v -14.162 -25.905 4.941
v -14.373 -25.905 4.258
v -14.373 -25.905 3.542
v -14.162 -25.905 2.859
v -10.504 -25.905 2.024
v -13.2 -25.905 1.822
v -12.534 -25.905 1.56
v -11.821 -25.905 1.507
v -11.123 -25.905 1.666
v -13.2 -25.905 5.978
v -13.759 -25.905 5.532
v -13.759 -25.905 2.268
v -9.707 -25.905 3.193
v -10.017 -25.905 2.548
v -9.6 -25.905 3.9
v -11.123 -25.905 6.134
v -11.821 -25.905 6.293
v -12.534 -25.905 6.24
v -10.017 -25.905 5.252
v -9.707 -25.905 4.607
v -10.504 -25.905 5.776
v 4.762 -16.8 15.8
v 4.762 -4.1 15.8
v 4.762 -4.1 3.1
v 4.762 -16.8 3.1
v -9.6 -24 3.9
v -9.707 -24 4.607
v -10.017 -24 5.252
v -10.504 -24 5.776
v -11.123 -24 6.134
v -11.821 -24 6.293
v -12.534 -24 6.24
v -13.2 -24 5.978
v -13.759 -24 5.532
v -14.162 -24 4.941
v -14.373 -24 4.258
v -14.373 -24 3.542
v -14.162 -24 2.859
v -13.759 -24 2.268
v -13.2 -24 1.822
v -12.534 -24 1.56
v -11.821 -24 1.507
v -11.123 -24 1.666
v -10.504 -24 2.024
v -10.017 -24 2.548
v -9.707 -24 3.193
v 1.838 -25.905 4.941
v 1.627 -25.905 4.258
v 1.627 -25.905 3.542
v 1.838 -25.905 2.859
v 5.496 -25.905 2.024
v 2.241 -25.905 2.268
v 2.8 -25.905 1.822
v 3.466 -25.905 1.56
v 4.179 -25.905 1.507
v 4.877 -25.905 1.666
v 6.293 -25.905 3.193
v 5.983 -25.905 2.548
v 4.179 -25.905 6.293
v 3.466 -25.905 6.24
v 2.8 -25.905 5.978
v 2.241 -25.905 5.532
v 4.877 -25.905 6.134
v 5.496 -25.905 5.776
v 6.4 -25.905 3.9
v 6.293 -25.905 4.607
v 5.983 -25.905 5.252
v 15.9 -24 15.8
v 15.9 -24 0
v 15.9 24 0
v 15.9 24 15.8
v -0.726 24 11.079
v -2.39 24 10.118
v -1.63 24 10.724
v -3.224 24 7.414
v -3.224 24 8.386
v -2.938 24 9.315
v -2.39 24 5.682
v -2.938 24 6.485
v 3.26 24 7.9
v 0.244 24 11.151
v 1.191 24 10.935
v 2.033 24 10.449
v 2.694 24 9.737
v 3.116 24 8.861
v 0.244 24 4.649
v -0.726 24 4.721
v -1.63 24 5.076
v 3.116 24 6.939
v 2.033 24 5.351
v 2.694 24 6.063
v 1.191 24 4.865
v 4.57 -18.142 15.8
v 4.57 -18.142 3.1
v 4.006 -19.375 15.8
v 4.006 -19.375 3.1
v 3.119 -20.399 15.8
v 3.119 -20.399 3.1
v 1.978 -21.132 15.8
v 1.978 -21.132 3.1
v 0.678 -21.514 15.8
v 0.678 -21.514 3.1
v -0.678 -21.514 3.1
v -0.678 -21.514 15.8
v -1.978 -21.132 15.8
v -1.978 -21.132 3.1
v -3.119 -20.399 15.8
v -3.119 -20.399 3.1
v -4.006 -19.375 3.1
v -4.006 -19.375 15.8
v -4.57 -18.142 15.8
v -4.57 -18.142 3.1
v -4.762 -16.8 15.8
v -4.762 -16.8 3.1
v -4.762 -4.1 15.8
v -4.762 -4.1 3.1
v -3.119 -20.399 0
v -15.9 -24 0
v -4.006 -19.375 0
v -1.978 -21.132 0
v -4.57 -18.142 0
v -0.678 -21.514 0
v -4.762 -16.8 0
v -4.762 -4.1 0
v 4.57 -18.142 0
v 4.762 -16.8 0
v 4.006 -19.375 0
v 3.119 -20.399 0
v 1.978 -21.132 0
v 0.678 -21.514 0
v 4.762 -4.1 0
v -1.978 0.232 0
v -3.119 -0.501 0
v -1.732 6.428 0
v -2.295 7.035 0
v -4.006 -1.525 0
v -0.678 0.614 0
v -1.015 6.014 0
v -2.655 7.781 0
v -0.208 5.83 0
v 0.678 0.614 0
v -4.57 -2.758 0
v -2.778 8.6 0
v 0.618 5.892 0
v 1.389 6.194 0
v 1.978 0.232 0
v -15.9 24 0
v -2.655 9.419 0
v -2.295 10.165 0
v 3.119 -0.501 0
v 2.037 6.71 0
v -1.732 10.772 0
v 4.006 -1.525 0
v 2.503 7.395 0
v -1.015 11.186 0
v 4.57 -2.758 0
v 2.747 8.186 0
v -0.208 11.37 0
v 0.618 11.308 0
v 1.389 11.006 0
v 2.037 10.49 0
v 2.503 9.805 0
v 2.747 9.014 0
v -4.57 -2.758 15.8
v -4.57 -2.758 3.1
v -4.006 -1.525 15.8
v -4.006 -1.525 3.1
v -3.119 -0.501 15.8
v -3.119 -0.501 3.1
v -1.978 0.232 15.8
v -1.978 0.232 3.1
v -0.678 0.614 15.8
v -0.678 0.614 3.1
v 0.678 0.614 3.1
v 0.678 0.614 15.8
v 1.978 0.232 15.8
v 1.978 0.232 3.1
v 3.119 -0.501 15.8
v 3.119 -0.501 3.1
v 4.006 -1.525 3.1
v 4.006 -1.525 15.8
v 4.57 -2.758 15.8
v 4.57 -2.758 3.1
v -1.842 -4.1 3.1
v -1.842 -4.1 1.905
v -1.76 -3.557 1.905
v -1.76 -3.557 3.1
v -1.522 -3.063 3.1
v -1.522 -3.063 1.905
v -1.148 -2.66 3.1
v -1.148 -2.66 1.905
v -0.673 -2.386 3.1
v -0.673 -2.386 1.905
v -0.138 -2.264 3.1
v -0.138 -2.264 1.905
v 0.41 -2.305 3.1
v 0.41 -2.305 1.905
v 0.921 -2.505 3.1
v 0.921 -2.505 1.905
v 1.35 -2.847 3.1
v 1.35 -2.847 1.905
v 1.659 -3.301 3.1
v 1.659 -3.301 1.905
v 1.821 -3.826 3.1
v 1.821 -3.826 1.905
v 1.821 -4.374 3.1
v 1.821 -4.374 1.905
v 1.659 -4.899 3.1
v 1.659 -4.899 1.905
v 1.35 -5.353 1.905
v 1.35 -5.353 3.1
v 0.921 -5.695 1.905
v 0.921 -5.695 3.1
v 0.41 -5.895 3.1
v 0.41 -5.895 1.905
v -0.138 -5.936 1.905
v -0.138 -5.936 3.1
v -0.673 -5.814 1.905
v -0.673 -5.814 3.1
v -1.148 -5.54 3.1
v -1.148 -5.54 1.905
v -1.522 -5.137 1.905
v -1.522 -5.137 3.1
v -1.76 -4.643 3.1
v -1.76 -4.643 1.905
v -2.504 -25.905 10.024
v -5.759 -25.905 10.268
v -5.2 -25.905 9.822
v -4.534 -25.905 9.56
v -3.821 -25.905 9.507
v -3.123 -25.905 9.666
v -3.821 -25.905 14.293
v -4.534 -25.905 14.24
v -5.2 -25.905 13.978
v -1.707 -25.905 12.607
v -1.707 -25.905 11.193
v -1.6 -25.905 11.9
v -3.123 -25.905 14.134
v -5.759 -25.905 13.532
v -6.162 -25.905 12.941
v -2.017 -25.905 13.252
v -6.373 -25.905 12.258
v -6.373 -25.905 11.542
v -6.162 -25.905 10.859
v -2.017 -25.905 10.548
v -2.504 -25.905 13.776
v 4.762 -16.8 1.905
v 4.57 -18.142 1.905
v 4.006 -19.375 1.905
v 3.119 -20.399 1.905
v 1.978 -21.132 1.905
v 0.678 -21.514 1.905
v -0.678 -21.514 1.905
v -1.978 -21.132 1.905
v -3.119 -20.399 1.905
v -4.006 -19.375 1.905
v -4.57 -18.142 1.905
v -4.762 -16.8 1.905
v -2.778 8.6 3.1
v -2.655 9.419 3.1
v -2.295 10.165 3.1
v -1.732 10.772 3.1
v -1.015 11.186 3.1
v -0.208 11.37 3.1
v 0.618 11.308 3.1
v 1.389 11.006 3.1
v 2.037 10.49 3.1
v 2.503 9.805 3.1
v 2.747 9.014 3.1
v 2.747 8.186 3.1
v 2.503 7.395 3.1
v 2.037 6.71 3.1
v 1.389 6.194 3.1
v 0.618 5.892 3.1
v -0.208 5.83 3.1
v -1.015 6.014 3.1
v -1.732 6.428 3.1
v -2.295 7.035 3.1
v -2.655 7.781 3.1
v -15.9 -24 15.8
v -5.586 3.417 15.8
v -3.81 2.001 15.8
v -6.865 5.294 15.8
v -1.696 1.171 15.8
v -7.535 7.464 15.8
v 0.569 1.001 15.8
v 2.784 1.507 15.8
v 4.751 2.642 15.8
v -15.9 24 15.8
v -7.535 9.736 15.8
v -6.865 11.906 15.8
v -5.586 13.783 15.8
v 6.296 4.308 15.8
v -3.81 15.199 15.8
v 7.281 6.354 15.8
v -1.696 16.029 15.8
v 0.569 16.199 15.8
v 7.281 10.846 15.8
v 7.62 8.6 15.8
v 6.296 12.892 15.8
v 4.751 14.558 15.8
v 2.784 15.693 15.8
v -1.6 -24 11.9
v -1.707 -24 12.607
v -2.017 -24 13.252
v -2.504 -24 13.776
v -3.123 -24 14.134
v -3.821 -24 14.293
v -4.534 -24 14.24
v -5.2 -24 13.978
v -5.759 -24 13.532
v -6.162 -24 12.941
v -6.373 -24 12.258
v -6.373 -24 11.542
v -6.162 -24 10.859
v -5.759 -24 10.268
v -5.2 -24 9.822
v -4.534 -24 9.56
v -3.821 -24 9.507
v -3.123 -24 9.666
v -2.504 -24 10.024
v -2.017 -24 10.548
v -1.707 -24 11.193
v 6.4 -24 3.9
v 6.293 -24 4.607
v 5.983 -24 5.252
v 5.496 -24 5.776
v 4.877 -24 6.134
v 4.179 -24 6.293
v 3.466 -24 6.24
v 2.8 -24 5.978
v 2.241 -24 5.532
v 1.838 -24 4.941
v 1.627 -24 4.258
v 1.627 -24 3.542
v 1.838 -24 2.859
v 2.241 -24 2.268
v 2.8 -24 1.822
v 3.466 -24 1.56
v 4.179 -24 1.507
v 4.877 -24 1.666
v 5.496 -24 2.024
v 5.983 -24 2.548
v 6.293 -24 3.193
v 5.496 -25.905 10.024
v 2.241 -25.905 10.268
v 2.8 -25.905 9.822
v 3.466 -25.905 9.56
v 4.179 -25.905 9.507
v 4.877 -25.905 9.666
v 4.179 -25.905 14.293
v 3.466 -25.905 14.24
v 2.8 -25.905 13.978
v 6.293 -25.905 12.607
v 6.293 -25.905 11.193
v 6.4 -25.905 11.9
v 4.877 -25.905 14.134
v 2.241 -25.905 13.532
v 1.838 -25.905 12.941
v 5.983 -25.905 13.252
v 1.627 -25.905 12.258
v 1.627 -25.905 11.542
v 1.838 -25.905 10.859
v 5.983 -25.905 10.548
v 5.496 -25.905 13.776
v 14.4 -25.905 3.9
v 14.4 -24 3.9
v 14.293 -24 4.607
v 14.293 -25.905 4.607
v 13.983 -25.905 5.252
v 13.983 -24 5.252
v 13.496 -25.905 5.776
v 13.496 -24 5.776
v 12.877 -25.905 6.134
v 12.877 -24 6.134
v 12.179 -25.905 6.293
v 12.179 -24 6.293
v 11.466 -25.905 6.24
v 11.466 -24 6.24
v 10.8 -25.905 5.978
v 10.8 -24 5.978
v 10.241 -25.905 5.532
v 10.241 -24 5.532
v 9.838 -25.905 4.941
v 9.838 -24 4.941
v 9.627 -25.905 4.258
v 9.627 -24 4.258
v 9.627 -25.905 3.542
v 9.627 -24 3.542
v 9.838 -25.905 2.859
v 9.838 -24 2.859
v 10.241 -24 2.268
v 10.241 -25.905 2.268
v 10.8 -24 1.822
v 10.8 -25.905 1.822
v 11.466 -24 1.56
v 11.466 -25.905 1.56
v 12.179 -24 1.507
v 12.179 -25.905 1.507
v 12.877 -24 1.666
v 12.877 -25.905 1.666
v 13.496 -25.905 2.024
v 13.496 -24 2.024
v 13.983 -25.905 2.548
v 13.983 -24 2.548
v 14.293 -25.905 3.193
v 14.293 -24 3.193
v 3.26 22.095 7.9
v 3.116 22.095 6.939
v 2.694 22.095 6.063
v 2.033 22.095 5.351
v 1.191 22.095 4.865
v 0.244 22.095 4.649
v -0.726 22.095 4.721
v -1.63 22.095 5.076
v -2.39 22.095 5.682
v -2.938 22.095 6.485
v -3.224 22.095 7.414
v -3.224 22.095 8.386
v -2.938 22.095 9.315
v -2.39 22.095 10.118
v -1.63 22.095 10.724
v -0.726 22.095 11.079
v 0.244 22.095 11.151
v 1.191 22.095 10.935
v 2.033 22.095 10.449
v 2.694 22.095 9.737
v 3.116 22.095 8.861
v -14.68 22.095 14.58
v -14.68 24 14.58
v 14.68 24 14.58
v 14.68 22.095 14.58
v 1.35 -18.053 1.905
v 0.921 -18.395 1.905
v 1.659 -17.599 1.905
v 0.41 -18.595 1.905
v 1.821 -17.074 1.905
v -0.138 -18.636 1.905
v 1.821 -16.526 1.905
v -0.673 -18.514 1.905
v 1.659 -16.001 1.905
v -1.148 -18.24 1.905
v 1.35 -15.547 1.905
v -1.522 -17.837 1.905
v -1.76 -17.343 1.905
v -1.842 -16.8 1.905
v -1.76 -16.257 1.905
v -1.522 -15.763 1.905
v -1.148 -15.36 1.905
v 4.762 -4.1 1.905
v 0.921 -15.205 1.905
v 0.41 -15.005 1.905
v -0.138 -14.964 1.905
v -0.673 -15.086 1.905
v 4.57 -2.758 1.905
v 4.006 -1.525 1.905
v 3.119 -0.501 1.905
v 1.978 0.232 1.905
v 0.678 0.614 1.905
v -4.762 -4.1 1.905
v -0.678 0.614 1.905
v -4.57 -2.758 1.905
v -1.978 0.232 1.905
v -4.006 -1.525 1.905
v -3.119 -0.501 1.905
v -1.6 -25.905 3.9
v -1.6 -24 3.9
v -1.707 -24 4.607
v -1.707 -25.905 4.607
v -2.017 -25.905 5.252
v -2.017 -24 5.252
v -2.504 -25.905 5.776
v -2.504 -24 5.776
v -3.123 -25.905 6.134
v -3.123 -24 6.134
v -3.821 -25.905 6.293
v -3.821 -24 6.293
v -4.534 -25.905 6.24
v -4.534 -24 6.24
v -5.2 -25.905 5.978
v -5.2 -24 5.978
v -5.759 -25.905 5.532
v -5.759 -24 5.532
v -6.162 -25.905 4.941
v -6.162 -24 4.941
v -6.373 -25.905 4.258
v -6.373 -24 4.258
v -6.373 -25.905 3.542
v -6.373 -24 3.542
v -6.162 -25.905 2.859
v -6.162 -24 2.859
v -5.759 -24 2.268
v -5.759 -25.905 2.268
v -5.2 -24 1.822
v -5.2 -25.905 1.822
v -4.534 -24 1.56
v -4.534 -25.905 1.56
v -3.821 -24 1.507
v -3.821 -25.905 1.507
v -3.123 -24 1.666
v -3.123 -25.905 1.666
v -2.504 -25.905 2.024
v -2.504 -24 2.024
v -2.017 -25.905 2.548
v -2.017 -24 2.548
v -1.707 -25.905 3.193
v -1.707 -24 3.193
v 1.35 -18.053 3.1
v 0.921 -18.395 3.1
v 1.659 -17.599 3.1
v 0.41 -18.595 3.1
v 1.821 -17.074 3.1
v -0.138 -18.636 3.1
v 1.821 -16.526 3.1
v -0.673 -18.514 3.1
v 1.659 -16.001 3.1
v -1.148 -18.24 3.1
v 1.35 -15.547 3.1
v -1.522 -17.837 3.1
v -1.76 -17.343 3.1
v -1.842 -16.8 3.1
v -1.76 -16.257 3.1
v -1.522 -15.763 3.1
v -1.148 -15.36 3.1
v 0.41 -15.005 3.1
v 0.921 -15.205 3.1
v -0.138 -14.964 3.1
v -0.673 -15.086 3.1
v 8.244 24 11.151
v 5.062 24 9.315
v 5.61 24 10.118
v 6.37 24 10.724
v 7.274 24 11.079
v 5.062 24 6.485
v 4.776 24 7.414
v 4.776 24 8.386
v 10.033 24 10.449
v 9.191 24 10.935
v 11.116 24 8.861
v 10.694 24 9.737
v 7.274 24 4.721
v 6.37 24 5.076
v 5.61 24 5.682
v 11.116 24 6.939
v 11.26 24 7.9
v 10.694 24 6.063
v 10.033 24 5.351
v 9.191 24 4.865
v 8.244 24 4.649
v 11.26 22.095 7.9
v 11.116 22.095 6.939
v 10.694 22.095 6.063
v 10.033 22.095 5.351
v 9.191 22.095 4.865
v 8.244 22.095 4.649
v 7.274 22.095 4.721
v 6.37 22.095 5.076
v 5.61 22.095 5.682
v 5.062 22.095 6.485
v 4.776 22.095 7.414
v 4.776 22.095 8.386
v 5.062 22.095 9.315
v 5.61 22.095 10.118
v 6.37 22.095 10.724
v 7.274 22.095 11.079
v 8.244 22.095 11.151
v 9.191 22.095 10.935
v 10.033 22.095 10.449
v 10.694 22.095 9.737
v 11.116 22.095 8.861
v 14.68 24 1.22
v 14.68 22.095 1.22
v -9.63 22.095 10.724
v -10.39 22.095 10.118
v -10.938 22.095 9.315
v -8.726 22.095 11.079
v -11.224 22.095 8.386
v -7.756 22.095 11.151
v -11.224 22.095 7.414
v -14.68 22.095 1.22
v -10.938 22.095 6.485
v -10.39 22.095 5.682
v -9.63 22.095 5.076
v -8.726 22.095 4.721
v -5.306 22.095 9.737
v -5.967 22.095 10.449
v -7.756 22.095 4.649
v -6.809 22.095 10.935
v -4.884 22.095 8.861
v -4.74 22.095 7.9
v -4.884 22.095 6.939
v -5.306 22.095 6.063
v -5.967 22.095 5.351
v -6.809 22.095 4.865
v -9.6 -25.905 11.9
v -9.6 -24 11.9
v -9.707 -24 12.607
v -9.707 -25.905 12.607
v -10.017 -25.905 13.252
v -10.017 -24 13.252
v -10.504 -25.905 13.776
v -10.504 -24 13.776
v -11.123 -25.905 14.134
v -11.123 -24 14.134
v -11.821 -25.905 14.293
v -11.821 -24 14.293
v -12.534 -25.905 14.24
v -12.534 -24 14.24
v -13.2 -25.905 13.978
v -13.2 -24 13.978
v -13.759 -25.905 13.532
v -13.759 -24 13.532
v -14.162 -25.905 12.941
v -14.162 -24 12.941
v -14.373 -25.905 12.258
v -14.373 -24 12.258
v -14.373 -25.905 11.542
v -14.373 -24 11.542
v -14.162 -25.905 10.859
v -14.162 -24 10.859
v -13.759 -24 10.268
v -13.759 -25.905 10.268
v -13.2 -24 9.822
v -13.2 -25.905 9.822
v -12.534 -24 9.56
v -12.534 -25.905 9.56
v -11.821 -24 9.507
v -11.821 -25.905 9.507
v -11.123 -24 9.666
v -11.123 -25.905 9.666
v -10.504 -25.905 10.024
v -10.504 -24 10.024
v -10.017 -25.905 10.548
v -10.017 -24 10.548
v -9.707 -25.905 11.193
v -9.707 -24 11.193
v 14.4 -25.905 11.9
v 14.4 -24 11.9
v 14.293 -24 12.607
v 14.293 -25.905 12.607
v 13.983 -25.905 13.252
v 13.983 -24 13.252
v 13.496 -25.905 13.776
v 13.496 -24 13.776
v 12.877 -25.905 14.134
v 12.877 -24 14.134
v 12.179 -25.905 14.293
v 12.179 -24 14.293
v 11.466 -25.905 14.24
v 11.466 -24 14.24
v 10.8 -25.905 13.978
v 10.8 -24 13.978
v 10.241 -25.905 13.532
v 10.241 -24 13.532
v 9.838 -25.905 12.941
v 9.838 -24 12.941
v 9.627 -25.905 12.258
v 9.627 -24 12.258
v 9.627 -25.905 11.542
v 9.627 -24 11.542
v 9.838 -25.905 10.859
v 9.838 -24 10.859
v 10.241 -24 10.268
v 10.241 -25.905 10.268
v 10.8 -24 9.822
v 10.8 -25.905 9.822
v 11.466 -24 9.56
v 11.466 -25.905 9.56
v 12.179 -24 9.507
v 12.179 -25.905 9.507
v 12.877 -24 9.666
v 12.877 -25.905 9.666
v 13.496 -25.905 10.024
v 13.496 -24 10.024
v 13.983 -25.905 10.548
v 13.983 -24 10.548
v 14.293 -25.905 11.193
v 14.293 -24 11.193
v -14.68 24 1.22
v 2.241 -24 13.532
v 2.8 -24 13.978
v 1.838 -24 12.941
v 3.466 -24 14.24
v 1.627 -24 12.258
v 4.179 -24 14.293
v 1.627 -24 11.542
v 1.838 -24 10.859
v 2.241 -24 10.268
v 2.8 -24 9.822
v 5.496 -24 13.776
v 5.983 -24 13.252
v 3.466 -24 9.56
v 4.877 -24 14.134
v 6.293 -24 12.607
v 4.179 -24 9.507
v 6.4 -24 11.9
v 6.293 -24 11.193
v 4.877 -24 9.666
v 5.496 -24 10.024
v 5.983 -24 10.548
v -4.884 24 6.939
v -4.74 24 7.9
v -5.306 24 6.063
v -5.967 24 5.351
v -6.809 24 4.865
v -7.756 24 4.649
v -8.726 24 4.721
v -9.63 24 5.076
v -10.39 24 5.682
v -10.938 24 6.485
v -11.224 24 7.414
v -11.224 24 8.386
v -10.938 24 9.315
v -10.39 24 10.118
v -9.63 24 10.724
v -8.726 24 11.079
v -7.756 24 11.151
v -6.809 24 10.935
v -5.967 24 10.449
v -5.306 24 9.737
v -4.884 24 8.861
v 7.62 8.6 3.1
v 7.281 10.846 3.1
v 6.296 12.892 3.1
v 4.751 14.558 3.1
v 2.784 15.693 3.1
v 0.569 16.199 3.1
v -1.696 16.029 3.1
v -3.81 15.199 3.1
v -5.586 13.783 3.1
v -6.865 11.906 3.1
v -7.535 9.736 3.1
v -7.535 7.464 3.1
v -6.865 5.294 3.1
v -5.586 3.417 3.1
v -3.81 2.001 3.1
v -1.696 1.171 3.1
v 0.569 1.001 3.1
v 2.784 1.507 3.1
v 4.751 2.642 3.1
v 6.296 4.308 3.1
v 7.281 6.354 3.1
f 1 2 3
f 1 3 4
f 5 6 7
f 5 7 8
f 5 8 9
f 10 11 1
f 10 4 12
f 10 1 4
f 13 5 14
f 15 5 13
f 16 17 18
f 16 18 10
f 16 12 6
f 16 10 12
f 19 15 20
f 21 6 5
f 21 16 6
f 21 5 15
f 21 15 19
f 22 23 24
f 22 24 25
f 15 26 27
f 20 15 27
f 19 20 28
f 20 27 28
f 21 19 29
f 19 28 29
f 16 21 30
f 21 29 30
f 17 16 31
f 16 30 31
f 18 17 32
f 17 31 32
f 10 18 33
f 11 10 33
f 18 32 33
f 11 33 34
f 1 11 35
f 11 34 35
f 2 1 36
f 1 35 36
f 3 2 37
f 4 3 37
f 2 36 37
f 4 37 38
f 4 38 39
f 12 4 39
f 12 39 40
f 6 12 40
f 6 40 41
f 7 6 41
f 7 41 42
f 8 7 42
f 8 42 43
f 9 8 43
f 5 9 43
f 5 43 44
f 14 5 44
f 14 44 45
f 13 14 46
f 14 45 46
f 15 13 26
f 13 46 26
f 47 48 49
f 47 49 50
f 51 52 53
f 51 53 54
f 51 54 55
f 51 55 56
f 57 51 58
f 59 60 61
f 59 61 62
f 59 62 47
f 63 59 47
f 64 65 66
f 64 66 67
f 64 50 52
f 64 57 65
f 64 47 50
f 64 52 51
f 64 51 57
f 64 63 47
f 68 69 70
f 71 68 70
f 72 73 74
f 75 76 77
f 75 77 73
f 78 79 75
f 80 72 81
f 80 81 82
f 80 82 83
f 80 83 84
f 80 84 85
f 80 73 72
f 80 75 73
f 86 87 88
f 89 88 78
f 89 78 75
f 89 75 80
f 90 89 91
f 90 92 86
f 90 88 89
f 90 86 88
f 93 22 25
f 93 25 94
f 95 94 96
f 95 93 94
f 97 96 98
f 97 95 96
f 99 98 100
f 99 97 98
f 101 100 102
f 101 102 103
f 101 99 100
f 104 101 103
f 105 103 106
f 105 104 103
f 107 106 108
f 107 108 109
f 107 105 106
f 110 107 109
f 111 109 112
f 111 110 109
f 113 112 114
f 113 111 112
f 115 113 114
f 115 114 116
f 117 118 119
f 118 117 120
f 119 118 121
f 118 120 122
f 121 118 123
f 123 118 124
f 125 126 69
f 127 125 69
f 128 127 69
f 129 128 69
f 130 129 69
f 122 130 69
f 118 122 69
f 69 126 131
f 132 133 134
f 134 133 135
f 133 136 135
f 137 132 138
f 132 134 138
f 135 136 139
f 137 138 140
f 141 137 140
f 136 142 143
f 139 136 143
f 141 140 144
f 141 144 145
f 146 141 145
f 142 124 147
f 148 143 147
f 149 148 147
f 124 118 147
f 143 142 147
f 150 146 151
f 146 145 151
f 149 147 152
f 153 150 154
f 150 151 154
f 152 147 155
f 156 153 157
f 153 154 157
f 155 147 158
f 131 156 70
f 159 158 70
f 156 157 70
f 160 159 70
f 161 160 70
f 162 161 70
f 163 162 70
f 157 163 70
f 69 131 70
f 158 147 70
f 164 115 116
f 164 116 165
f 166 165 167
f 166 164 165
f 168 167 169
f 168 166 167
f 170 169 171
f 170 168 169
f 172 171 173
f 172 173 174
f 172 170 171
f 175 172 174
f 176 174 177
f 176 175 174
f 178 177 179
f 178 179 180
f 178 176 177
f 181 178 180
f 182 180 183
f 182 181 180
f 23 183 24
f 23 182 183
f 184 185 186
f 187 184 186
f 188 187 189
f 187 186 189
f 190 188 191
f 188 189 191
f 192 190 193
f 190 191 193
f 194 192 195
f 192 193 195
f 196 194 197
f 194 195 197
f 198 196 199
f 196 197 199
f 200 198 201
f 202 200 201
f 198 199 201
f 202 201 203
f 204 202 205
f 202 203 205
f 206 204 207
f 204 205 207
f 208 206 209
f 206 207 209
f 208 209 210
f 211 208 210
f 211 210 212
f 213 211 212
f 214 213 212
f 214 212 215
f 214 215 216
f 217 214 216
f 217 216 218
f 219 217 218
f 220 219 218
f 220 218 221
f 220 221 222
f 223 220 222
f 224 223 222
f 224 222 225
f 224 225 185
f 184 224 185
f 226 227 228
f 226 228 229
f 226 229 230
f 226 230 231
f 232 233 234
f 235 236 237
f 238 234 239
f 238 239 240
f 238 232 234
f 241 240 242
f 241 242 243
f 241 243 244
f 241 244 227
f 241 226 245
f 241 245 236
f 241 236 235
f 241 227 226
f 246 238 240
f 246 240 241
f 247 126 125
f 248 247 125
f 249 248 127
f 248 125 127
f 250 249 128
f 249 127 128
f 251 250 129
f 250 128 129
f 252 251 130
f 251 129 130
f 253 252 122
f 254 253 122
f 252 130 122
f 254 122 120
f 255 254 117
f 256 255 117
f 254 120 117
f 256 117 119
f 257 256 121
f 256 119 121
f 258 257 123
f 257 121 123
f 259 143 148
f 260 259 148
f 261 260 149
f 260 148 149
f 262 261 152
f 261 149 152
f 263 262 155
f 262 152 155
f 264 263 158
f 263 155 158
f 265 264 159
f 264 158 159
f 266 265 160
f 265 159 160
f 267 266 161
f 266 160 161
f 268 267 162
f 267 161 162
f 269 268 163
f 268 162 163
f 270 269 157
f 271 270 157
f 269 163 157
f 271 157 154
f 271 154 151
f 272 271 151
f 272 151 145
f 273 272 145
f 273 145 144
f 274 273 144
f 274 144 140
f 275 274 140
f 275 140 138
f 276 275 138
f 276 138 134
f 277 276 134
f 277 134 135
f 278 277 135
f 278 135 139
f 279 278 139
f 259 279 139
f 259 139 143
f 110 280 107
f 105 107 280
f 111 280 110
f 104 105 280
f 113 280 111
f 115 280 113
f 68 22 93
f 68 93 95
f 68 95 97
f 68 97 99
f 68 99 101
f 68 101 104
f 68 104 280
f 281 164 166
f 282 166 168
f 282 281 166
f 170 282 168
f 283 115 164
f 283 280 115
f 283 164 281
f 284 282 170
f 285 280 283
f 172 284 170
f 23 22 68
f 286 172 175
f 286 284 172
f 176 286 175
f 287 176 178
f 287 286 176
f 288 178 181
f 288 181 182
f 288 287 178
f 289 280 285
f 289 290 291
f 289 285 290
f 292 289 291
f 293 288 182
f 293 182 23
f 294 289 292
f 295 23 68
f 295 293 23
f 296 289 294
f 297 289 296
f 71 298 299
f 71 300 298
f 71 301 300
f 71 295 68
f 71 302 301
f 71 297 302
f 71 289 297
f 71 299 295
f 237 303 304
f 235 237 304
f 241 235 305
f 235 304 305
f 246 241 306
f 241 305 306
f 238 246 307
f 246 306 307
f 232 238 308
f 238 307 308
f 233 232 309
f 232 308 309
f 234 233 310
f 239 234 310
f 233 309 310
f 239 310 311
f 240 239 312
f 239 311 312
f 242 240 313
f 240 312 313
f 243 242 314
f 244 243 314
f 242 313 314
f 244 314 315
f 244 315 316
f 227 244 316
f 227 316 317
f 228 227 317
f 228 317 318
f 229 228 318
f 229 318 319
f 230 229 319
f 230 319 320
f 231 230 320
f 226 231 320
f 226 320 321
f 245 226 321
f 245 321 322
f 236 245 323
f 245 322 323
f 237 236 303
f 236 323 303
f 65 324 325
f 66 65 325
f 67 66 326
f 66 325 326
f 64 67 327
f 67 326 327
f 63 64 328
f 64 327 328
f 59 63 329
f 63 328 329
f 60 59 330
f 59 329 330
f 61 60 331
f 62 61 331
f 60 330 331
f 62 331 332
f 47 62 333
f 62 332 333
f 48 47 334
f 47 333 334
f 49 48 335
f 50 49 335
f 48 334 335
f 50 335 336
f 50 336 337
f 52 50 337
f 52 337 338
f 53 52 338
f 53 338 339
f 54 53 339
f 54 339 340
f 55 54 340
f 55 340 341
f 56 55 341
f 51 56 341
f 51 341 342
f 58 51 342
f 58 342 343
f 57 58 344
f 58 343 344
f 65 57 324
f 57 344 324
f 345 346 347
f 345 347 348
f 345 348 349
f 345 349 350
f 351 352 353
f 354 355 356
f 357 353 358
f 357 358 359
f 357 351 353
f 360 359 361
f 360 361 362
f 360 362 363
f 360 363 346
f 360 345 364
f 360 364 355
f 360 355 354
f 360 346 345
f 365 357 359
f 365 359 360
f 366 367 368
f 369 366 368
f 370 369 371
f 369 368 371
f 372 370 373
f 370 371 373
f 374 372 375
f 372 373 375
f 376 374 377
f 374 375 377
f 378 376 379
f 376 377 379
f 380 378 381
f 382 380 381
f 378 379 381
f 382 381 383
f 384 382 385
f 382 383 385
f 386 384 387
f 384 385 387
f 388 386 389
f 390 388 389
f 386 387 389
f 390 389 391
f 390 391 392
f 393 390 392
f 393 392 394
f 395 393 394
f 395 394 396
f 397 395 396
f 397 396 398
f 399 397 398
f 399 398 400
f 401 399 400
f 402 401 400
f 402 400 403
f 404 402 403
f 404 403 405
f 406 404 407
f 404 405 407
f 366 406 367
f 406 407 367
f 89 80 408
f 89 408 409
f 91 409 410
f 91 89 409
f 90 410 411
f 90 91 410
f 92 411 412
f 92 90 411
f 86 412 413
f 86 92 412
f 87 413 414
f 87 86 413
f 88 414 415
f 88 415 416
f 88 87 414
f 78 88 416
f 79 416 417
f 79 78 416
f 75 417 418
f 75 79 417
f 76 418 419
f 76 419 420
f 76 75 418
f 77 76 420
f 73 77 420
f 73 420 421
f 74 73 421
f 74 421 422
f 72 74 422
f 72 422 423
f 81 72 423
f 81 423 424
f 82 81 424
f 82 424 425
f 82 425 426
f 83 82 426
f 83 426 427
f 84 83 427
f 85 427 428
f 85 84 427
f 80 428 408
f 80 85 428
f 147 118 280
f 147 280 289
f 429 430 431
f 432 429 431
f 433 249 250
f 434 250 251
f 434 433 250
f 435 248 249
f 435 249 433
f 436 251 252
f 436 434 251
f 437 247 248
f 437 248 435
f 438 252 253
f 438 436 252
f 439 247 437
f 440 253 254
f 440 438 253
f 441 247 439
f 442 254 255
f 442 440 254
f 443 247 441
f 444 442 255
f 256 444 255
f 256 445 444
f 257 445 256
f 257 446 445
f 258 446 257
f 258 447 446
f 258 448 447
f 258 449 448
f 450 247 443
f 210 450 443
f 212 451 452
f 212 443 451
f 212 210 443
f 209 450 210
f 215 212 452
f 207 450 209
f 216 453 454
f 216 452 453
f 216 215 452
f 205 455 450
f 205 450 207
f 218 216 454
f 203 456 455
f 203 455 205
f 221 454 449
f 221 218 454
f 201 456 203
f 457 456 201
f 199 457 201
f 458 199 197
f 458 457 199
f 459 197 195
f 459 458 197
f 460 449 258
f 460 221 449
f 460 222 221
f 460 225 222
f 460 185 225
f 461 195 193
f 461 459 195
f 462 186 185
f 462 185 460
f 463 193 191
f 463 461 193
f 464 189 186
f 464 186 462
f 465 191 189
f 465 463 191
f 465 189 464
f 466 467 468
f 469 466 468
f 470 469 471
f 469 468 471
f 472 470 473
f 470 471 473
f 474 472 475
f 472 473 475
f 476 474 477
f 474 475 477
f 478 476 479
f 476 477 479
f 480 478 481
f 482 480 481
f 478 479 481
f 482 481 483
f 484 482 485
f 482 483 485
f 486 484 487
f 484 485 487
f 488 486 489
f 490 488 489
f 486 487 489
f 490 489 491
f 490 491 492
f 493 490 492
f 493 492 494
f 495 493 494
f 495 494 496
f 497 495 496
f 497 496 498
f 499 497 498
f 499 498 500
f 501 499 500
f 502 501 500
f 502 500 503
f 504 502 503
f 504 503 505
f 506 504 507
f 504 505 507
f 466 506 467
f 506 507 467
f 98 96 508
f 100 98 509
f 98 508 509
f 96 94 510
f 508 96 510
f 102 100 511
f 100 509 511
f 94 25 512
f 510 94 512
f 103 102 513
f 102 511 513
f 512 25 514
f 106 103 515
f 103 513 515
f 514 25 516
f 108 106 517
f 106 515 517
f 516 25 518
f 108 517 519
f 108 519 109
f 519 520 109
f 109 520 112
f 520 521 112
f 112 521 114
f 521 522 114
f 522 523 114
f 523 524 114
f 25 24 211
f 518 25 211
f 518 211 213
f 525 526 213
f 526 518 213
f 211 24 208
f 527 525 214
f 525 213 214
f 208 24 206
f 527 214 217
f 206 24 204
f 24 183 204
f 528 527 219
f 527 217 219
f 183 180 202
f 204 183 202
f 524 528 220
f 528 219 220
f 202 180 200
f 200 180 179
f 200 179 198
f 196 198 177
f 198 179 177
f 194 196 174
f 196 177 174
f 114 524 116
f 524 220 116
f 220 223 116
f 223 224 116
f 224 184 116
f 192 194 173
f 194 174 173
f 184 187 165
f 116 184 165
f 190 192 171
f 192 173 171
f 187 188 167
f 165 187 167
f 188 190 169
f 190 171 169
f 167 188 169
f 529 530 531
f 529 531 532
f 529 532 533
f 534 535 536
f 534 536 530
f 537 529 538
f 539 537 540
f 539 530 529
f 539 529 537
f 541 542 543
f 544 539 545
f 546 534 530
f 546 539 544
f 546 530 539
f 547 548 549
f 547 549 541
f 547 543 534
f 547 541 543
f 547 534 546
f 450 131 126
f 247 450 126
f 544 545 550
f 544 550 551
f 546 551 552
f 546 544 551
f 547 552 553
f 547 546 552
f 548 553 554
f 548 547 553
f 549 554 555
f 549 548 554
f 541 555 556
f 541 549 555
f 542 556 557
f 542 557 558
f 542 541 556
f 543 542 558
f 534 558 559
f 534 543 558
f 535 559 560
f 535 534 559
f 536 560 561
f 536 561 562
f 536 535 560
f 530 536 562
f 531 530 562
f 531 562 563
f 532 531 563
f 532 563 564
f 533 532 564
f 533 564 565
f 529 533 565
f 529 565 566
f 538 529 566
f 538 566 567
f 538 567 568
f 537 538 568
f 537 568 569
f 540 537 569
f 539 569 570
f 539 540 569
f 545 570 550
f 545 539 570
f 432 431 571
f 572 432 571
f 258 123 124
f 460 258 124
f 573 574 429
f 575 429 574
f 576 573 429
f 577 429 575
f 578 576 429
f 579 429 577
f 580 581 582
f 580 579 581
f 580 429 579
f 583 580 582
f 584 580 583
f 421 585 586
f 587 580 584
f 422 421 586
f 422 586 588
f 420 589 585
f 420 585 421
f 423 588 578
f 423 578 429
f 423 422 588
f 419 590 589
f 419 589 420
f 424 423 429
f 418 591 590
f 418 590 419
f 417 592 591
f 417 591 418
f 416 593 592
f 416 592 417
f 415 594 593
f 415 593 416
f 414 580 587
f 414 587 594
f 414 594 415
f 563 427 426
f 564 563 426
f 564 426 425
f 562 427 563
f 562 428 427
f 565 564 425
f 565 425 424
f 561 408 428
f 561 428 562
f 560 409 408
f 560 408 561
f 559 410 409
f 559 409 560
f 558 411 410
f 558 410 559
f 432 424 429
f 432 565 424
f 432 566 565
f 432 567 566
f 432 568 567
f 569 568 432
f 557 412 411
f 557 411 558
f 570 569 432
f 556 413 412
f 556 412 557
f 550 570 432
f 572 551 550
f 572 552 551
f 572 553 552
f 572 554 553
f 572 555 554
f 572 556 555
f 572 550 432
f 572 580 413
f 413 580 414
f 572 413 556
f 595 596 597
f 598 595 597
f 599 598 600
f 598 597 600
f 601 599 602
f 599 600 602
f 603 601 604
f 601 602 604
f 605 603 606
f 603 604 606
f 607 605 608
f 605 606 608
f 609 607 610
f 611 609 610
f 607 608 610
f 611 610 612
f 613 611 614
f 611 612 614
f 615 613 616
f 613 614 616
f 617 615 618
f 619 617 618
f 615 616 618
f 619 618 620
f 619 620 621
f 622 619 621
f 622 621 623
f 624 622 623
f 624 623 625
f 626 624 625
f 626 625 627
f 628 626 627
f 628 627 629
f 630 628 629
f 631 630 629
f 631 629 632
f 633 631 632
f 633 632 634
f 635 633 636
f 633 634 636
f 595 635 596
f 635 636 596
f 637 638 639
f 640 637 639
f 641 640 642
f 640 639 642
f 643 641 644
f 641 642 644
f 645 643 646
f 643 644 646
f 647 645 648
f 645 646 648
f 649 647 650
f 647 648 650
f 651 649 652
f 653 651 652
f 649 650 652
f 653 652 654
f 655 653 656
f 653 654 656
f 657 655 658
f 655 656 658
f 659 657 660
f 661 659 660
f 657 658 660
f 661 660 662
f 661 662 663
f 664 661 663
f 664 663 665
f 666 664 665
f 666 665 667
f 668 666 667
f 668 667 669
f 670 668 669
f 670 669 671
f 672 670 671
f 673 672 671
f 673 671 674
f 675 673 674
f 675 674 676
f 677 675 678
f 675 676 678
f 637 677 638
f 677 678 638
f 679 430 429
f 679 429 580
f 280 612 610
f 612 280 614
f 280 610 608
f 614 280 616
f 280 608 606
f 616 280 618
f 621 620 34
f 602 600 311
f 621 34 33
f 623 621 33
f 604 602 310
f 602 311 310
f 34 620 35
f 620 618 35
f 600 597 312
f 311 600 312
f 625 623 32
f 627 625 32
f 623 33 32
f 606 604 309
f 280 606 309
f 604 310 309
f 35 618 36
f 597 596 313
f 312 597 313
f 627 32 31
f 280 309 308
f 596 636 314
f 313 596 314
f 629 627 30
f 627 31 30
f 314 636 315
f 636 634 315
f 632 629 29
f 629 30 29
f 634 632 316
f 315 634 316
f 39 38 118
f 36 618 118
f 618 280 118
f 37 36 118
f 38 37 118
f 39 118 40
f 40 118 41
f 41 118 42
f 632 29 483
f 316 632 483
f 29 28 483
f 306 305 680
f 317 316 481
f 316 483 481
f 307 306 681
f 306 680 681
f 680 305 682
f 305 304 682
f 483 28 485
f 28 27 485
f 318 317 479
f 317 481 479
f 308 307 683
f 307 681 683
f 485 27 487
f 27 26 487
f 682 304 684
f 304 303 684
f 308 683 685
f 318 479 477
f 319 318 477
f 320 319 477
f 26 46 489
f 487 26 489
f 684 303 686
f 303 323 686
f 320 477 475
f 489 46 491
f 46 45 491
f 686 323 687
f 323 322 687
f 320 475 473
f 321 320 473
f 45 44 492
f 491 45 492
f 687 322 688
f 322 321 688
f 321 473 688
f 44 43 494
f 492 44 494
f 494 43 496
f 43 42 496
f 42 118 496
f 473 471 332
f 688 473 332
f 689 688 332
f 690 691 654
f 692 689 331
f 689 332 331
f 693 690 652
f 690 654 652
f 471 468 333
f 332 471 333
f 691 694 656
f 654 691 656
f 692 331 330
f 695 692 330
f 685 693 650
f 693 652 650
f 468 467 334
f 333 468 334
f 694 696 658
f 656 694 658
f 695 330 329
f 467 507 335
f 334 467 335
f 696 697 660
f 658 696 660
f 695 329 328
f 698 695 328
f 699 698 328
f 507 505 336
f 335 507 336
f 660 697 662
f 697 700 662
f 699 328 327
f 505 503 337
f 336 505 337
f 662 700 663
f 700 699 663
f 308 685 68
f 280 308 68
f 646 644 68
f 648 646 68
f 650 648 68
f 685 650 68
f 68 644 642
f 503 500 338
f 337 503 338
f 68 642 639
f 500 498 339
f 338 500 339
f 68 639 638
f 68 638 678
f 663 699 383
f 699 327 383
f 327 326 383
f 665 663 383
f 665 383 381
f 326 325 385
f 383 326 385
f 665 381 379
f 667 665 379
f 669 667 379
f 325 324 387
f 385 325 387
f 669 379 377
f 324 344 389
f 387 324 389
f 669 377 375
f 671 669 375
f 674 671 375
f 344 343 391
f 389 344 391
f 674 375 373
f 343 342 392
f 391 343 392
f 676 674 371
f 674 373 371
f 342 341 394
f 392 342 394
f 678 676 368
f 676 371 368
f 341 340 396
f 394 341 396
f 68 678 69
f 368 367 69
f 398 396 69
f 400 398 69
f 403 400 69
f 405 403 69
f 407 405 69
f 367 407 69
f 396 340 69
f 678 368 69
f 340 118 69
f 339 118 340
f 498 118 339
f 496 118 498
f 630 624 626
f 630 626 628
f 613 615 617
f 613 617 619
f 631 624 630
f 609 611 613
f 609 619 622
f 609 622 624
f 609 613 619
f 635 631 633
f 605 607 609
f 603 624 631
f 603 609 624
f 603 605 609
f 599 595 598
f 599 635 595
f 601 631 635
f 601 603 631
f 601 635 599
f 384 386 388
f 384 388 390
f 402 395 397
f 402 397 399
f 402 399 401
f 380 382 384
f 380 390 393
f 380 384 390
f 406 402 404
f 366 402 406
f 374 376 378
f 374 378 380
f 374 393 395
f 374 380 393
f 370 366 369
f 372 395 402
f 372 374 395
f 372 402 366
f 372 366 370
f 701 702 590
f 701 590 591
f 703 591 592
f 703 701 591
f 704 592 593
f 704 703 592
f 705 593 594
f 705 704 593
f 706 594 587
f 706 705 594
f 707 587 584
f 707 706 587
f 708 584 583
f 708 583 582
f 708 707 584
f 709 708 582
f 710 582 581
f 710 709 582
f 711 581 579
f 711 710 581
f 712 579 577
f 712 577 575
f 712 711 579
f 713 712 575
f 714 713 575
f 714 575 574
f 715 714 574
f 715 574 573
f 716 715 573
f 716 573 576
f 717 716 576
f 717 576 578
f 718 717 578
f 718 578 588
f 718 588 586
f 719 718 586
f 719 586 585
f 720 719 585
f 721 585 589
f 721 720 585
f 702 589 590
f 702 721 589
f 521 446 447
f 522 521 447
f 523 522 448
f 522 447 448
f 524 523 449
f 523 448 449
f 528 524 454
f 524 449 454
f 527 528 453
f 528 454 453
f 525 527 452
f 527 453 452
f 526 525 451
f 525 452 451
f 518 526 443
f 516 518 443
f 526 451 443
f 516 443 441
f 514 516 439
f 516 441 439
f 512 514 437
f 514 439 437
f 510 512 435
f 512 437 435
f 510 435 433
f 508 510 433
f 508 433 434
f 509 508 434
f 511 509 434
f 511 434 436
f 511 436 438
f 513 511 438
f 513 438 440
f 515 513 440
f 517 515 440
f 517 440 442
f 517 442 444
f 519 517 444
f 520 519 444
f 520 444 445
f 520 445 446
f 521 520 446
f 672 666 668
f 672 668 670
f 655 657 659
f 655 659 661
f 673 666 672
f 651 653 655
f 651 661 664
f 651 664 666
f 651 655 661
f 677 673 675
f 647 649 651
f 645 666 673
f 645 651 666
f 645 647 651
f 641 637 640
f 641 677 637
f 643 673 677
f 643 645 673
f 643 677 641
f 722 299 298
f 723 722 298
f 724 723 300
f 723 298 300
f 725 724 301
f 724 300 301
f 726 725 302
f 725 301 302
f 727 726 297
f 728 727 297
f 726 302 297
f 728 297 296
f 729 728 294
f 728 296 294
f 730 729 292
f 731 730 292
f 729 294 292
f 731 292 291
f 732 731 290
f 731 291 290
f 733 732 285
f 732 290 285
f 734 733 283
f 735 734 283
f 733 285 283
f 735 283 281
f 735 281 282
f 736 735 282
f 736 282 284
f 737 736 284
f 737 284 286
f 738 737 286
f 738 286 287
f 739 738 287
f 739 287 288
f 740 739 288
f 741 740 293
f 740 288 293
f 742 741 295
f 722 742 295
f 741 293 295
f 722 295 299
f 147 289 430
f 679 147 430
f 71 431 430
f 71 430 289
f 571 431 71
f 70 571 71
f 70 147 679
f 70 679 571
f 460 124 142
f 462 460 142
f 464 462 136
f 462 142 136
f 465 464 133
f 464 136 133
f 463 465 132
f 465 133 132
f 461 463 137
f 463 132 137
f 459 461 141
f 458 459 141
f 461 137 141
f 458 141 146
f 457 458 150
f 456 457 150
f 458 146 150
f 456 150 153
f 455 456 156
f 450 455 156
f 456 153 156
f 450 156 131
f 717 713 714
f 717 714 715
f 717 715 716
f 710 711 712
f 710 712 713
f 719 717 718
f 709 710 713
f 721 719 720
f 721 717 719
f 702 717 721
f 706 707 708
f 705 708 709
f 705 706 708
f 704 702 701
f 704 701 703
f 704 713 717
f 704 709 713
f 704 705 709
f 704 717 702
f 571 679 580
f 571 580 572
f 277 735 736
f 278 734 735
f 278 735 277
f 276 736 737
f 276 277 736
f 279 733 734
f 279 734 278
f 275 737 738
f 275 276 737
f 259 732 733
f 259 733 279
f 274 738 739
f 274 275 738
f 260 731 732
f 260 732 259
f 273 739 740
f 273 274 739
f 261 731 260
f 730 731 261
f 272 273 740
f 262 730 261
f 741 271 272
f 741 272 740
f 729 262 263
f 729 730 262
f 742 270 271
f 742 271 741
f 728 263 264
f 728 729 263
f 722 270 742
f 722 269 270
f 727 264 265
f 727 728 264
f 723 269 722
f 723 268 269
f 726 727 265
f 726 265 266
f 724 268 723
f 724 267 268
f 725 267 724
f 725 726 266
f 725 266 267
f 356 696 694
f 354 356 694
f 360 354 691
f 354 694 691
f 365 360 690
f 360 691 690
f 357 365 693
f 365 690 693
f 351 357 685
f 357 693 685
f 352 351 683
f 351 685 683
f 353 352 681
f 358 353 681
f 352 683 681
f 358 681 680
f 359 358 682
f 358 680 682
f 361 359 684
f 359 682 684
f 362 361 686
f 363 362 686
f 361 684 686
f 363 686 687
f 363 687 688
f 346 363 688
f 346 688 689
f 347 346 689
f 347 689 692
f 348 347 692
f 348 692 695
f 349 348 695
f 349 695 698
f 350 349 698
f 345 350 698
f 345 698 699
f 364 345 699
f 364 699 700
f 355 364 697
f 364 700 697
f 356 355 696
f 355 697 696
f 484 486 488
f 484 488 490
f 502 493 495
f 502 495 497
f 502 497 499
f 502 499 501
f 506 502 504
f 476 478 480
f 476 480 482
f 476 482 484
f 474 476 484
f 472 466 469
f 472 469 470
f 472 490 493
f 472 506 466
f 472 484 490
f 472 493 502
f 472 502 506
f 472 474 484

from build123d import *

# Parameters (mm, degrees)
SKETCH1_W           = 31.8
SKETCH1_H           = 48
BOSS_EXTRUDE1_DEPTH = 15.8
SKETCH2_R           = 7.62
CUT_EXTRUDE1_DEPTH  = 12.7
SKETCH3_R           = 2.77815
SKETCH3_R_2         = 1.8415
CUT_EXTRUDE2_DEPTH  = 12.7
CUT_EXTRUDE3_DEPTH  = 1.905
SKETCH5_R           = 2.4
BOSS_EXTRUDE2_DEPTH = 1.905
SKETCH6_W           = 29.36
SKETCH6_H           = 13.36
SKETCH6_R           = 3.2605
CUT_EXTRUDE4_DEPTH  = 1.905


with BuildPart() as part:
    # Sketch1 → Boss-Extrude1 (new body)
    with BuildSketch(Plane.XY):
        Rectangle(SKETCH1_W, SKETCH1_H)
    extrude(amount=BOSS_EXTRUDE1_DEPTH)

    # Sketch2 → Cut-Extrude1 (cut)
    with BuildSketch(Plane.XY.offset(15.8)):
        with Locations((0, 8.6)):
            Circle(SKETCH2_R)
        with BuildLine():
            Line((4.7625, -4.1), (4.7625, -16.8))
            ThreePointArc((4.7625, -16.8), (0, -21.5625), (-4.7625, -16.8))
            Line((-4.7625, -16.8), (-4.7625, -4.1))
            ThreePointArc((-4.7625, -4.1), (0, 0.6625), (4.7625, -4.1))
        make_face()
    extrude(amount=-CUT_EXTRUDE1_DEPTH, mode=Mode.SUBTRACT)

    # Sketch3 → Cut-Extrude2 (cut)
    with BuildSketch(Plane(origin=(0, 0, 0), x_dir=(-1, 0, 0), z_dir=(0, 0, -1))):
        with Locations((0, 8.6)):
            Circle(SKETCH3_R)
        with Locations((0, -4.1)):
            Circle(SKETCH3_R_2)
        with Locations((0, -16.8)):
            Circle(SKETCH3_R_2)
    extrude(amount=-CUT_EXTRUDE2_DEPTH, mode=Mode.SUBTRACT)

    # Sketch4 → Cut-Extrude3 (cut)
    with BuildSketch(Plane(origin=(0, 0, 0), x_dir=(-1, 0, 0), z_dir=(0, 0, -1))):
        with BuildLine():
            Line((4.7625, -16.8), (4.7625, -4.1))
            ThreePointArc((4.7625, -4.1), (0, 0.6625), (-4.7625, -4.1))
            Line((-4.7625, -4.1), (-4.7625, -16.8))
            ThreePointArc((-4.7625, -16.8), (0, -21.5625), (4.7625, -16.8))
        make_face()
    extrude(amount=-CUT_EXTRUDE3_DEPTH, mode=Mode.SUBTRACT)

    # Sketch5 → Boss-Extrude2 (add)
    with BuildSketch(Plane.XZ.offset(24)):
        with Locations((-12, 11.9)):
            Circle(SKETCH5_R)
        with Locations((-12, 3.9)):
            Circle(SKETCH5_R)
        with Locations((-4, 11.9)):
            Circle(SKETCH5_R)
        with Locations((-4, 3.9)):
            Circle(SKETCH5_R)
        with Locations((4, 11.9)):
            Circle(SKETCH5_R)
        with Locations((4, 3.9)):
            Circle(SKETCH5_R)
        with Locations((12, 11.9)):
            Circle(SKETCH5_R)
        with Locations((12, 3.9)):
            Circle(SKETCH5_R)
    extrude(amount=BOSS_EXTRUDE2_DEPTH)

    # Sketch6 → Cut-Extrude4 (cut)
    with BuildSketch(Plane(origin=(0, 24, 0), x_dir=(1, 0, 0), z_dir=(0, 1, 0))):
        with Locations((0, -7.9)):
            Rectangle(SKETCH6_W, SKETCH6_H)
        with Locations((-8, -7.9)):
            Circle(SKETCH6_R, mode=Mode.SUBTRACT)
        with Locations((0, -7.9)):
            Circle(SKETCH6_R, mode=Mode.SUBTRACT)
        with Locations((8, -7.9)):
            Circle(SKETCH6_R, mode=Mode.SUBTRACT)
    extrude(amount=-CUT_EXTRUDE4_DEPTH, mode=Mode.SUBTRACT)


solid = part.part
